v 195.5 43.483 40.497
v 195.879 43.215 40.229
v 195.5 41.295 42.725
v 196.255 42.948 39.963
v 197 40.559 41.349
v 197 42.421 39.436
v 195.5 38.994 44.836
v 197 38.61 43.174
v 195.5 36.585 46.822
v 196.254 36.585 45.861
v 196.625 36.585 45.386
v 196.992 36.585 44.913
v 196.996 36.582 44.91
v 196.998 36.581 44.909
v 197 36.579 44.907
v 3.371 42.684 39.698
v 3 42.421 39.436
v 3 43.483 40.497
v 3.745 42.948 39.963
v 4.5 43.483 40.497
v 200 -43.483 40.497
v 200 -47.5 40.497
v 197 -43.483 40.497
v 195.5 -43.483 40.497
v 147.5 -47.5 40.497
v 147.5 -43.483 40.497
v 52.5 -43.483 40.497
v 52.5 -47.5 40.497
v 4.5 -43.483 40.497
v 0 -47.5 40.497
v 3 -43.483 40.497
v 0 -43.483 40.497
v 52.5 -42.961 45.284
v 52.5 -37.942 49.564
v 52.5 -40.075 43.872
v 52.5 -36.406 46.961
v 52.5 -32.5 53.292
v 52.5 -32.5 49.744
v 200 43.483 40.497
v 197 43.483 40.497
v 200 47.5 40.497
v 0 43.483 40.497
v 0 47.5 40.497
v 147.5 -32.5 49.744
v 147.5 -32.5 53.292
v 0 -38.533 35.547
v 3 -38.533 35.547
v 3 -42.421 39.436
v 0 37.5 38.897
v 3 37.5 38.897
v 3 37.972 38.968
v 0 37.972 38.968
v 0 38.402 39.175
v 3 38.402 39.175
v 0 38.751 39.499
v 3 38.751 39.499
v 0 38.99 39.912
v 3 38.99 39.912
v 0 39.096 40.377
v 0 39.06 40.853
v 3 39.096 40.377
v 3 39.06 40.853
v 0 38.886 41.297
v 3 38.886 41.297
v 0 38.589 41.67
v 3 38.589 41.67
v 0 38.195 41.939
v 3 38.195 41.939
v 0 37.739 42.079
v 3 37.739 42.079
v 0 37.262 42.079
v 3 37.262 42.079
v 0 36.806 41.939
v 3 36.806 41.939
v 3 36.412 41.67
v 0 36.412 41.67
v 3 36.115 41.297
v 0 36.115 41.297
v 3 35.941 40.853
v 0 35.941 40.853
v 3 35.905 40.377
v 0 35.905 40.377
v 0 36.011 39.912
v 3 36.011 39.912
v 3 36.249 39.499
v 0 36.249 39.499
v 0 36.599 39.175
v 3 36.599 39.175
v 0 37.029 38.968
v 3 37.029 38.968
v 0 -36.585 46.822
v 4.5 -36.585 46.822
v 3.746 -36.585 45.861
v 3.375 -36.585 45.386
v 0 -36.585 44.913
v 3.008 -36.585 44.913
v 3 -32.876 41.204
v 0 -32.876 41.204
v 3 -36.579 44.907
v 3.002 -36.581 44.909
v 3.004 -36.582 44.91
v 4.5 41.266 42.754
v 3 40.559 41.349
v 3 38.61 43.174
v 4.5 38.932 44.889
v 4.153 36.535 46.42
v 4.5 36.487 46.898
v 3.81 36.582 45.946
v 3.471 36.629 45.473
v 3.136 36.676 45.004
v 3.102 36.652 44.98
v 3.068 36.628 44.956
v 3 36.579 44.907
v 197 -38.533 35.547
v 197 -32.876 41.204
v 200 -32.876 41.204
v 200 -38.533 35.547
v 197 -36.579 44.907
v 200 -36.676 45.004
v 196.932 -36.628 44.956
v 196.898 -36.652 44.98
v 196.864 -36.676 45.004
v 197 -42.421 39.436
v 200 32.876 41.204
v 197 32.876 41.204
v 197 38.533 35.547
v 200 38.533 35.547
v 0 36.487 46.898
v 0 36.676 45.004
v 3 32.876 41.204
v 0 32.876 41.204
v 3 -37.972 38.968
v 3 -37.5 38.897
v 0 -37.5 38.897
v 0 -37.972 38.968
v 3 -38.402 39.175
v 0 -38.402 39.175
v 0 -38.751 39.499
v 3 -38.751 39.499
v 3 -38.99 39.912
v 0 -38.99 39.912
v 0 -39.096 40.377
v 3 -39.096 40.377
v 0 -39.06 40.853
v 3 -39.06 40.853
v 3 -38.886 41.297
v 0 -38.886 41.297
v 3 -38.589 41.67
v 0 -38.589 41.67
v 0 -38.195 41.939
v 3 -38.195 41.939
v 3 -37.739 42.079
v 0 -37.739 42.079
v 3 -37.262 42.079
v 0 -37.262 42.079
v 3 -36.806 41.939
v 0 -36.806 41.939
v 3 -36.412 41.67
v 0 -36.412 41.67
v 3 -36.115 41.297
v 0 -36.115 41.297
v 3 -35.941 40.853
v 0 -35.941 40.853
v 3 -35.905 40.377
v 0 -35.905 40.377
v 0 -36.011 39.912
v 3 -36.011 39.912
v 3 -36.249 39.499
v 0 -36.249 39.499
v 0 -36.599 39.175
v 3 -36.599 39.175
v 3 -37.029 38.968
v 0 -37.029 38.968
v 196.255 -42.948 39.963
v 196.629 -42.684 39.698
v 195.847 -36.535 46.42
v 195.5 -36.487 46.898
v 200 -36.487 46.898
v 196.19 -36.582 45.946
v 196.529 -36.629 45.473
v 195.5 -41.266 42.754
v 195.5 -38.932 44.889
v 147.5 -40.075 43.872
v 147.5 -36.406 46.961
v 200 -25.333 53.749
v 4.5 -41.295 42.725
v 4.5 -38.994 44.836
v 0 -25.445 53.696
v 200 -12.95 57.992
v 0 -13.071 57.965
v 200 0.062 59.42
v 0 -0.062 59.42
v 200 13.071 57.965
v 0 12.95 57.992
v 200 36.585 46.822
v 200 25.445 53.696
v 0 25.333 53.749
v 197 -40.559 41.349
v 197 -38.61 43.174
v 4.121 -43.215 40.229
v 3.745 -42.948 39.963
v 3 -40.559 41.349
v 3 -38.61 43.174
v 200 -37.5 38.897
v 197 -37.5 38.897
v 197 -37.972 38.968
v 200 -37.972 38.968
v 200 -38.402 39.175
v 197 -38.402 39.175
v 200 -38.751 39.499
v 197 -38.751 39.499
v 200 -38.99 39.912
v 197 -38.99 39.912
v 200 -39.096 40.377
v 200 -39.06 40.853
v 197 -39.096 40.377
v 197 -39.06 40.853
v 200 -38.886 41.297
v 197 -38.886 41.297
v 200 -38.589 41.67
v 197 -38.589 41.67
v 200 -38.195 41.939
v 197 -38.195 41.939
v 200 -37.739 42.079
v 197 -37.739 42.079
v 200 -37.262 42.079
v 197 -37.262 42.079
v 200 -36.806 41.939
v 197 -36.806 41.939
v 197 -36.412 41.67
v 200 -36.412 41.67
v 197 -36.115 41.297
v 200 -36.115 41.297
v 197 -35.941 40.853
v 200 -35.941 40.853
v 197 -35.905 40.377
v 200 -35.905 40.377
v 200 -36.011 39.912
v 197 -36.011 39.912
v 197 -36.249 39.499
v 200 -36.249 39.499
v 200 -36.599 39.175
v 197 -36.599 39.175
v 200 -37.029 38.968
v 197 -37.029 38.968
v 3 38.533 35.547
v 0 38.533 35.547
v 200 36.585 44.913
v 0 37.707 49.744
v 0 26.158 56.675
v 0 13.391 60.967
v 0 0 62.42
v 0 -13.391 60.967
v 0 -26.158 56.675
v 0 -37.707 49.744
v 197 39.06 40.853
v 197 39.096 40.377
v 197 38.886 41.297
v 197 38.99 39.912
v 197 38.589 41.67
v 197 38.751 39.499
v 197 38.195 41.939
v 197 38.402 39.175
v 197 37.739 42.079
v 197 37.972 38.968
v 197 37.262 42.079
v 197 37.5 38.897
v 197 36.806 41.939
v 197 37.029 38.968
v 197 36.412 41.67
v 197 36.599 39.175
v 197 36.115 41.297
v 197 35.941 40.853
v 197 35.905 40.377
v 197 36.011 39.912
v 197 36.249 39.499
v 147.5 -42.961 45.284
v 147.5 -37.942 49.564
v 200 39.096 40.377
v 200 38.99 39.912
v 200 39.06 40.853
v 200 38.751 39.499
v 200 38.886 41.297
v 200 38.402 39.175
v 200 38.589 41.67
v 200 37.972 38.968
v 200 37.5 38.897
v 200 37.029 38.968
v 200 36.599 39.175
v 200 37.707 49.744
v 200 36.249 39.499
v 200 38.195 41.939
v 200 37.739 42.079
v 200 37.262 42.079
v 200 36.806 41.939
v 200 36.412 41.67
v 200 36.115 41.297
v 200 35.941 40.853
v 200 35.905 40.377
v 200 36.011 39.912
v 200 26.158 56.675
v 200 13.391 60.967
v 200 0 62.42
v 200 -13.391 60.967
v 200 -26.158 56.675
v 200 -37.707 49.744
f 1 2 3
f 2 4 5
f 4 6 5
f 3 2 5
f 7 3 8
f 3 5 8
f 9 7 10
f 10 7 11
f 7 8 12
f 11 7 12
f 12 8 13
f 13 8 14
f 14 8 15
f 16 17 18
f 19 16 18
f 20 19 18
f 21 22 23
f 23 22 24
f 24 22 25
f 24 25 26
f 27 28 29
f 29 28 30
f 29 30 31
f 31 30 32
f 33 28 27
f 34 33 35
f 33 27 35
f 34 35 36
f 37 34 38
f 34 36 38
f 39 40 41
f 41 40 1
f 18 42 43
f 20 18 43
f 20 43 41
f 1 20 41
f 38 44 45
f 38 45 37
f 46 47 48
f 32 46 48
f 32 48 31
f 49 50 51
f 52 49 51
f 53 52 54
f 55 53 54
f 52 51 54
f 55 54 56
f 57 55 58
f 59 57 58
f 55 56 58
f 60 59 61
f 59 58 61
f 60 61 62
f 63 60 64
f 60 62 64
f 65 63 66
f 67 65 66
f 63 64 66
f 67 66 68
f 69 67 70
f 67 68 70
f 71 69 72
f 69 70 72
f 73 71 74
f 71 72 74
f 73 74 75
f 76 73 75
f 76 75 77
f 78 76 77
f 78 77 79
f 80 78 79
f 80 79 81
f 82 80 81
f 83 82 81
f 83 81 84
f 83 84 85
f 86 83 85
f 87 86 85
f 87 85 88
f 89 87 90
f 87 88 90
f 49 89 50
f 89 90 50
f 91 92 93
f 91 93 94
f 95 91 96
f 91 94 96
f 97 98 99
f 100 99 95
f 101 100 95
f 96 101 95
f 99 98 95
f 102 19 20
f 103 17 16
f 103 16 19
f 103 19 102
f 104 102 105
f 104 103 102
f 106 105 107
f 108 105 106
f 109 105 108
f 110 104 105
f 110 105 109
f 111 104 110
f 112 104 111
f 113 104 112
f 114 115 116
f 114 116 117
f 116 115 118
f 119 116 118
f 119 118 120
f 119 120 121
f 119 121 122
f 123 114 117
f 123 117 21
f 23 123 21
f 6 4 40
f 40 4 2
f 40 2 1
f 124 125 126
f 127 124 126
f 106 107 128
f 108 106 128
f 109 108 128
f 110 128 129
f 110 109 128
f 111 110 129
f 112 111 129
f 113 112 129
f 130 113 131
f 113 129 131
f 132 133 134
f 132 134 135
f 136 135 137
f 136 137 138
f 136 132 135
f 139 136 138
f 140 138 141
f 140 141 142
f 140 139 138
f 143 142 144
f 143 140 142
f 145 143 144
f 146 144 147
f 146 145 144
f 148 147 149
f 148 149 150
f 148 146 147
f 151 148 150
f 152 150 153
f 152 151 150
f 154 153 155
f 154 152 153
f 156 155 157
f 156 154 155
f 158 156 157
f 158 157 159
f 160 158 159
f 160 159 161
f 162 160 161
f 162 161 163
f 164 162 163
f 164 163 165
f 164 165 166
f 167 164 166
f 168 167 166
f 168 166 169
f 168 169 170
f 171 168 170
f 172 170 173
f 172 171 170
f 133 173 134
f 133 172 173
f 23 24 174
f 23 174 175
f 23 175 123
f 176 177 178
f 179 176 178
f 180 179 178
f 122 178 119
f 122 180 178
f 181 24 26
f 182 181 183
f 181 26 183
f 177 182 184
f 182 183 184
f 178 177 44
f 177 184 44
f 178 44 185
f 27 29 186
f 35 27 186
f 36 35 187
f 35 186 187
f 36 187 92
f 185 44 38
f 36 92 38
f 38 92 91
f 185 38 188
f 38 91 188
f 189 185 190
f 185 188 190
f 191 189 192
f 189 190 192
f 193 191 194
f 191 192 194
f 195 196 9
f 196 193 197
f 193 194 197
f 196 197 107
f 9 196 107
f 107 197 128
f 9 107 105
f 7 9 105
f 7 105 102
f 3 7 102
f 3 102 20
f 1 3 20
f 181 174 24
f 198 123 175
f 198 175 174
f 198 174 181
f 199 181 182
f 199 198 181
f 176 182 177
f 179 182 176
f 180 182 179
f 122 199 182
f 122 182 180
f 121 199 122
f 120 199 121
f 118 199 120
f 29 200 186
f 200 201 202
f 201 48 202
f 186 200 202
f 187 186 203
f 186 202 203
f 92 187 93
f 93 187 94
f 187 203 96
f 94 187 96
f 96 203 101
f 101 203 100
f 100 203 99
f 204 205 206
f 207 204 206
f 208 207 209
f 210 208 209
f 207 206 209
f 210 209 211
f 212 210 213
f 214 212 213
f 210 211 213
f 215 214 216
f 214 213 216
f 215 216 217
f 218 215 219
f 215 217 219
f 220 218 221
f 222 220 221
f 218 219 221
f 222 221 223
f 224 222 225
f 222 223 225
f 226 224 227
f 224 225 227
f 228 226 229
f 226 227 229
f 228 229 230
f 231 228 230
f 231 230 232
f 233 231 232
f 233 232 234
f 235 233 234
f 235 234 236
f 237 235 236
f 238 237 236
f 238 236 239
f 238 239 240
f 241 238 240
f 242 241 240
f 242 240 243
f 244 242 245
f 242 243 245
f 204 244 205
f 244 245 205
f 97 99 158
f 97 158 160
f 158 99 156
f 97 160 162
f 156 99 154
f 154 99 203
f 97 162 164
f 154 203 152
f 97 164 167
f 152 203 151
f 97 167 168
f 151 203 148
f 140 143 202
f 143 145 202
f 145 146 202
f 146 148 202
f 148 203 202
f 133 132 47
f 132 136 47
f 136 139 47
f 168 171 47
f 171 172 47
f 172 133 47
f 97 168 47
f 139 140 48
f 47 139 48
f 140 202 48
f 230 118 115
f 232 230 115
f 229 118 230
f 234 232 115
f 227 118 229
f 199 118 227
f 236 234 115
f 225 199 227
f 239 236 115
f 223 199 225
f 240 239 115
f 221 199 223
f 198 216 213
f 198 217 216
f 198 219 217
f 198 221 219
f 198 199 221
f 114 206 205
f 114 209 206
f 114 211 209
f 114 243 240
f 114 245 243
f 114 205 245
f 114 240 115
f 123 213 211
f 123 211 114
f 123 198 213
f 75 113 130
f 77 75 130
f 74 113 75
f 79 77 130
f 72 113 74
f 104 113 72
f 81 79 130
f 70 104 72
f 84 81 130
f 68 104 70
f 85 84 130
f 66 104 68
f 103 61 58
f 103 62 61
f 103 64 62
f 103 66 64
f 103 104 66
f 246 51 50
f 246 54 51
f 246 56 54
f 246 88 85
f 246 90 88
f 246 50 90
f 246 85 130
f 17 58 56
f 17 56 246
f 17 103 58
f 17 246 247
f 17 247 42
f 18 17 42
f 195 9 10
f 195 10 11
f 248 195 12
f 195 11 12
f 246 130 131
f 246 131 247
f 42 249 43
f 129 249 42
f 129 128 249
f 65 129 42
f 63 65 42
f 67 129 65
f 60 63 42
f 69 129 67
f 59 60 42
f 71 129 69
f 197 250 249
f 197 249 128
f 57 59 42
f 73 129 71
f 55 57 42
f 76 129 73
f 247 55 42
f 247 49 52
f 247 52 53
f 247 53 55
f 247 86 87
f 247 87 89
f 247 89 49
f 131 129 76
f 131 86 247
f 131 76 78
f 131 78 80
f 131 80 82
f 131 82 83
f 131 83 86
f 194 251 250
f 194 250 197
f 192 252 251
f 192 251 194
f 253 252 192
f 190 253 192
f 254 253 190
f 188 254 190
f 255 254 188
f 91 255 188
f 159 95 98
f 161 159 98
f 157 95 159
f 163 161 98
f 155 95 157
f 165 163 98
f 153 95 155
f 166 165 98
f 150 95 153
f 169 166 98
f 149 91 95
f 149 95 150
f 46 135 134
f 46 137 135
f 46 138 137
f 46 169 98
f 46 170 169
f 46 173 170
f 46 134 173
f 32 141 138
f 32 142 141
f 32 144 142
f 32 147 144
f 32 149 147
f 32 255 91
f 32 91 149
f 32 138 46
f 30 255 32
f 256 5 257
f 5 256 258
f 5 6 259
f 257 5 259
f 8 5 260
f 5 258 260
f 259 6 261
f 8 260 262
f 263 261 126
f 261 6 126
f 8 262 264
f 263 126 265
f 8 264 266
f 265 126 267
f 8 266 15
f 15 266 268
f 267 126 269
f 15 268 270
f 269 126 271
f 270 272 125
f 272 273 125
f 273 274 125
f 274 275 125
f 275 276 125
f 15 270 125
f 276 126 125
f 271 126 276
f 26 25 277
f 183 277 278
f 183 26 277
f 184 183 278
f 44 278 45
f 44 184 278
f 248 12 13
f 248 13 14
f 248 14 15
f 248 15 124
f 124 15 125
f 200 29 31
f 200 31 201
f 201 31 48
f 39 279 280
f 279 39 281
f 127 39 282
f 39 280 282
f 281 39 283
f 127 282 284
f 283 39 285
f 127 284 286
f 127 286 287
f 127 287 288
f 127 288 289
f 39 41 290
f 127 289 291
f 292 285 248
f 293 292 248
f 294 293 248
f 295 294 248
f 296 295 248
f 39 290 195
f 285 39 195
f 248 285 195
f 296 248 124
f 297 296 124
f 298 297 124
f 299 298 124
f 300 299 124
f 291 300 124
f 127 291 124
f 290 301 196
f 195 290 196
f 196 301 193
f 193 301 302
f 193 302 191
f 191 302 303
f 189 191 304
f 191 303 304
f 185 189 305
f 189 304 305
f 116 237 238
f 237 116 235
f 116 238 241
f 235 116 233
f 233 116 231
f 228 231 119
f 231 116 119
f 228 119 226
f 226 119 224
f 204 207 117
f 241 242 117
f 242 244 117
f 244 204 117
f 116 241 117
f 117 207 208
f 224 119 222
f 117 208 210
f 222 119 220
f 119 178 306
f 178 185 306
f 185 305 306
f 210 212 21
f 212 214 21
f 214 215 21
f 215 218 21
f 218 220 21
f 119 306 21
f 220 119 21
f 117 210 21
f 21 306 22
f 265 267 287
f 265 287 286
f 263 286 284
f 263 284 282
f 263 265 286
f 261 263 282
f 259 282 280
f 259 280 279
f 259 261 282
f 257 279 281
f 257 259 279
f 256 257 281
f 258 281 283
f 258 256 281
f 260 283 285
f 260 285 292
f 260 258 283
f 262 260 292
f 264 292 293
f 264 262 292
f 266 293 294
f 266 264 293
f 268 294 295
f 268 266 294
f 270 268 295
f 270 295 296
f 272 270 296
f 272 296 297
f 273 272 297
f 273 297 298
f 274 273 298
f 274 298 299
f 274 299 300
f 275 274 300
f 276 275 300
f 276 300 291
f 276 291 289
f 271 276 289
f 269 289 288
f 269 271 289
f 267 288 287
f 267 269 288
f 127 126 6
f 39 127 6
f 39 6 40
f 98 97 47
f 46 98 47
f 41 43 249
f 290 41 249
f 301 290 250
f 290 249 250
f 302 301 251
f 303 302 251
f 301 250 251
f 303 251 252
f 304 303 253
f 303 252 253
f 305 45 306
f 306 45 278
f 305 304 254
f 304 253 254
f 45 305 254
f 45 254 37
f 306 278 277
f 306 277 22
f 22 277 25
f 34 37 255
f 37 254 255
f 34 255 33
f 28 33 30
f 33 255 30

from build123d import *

# Parameters (mm, degrees)
EXTRUDE_2_DEPTH          = 200
EXTRUDE_START            = -3
SKETCH_3_R               = 1.6
EXTRUDE_3_DEPTH          = 3
MIRROR_START             = -3
MIRROR_3_COPY_1_SKETCH_R = 1.6
MIRROR_3_COPY_1_DEPTH    = 3
CHAMFER_2_SIZE           = 1.5
CHAMFER_2_SIZE_2         = 1.370885416
CUT_EXTRUDE_1_REACH      = 208.729
CUT_EXTRUDE_1_END_RADIUS = 62.42
SKETCH_4_W               = 95
SKETCH_4_H               = 15


with BuildPart() as part:
    # 草图2 → 凸台-拉伸2 (new body)
    with BuildSketch(Plane(origin=(0, 0, 0), x_dir=(0, 0, -1), z_dir=(1, 0, 0))):
        with BuildLine():
            Line((-40.496992481, 43.482525226), (-40.496992481, 47.5))
            ThreePointArc((-40.496992481, 47.5), (-62.42, 0), (-40.496992481, -47.5))
            Line((-40.496992481, -47.5), (-40.496992481, -43.482525226))
            ThreePointArc((-40.496992481, -43.482525226), (-59.42, 0), (-40.496992481, 43.482525226))
        make_face()
    extrude(amount=EXTRUDE_2_DEPTH)

    # 草图3 → 凸台-拉伸3 (add)
    with BuildSketch(Plane(origin=(200, 0, 0), x_dir=(0, 0, -1), z_dir=(1, 0, 0)).offset(EXTRUDE_START)):
        with BuildLine():
            Line((-35.547245013, 38.532777757), (-40.496992481, 43.482525226))
            ThreePointArc((-40.496992481, 43.482525226), (-43.333653576, 40.656252505), (-45.973519494, 37.64534374))
            Line((-45.973519494, 37.64534374), (-41.204099262, 32.875923508))
            Line((-41.204099262, 32.875923508), (-35.547245013, 38.532777757))
        make_face()
        with Locations((-40.496992481, 37.500401857)):
            Circle(SKETCH_3_R, mode=Mode.SUBTRACT)
    extrude_3 = extrude(amount=EXTRUDE_3_DEPTH)

    # 镜向2: 凸台-拉伸3 across plane
    add(extrude_3.mirror(Plane.ZX))

    # 镜向3: 凸台-拉伸3 across plane
    add(extrude_3.mirror(Plane(origin=(100, 0, 0), x_dir=(0, 0, 1), z_dir=(1, 0, 0))))

    # 镜向3 copy 1 sketch → 镜向3 copy 1 (add)
    with BuildSketch(Plane(origin=(0, 0, 0), x_dir=(0, 0, -1), z_dir=(-1, 0, 0)).offset(MIRROR_START)):
        with BuildLine():
            Line((-35.547245013, 38.532777757), (-40.496992481, 43.482525226))
            ThreePointArc((-40.496992481, 43.482525226), (-43.333653576, 40.656252505), (-45.973519494, 37.64534374))
            Line((-45.973519494, 37.64534374), (-41.204099262, 32.875923508))
            Line((-41.204099262, 32.875923508), (-35.547245013, 38.532777757))
        make_face()
        with Locations((-40.496992481, 37.500401857)):
            Circle(MIRROR_3_COPY_1_SKETCH_R, mode=Mode.SUBTRACT)
    extrude(amount=MIRROR_3_COPY_1_DEPTH)

    # 倒角2
    # the kernel refuses this chamfer: 1.5, 1.370885416 mm, written as the material it adds along each edge
    with BuildSketch(Plane(origin=(197, 37.64534374, 45.973519494), x_dir=(0, -0.7808949499846061, 0.6246623704758754), z_dir=(1, 0, 0)), Plane(origin=(3, -37.64534374, 45.973519494), x_dir=(0, 0.7808949499846081, 0.6246623704758728), z_dir=(-1, 0, 0))) as chamfer_2_piece_1:
        with BuildLine():
            Line((1.358262301, 0), (CHAMFER_2_SIZE * 0.110473116413, CHAMFER_2_SIZE * 0.993879112644))
            Line((CHAMFER_2_SIZE * 0.110473116413, CHAMFER_2_SIZE * 0.993879112644), (0, 0))
            ThreePointArc((0, 0), (0.697864858, -0.003878183), (1.358262301, 0))
        make_face()
    extrude(amount=3)
    with BuildSketch(Plane(origin=(197, 0, 0), x_dir=(0, 0.774455373383828, 0.6326285439631345), z_dir=(0, 0.6326285439631345, -0.774455373383828))) as chamfer_2_piece_2_section:
        Polygon((59.42, -CHAMFER_2_SIZE), (59.42 - CHAMFER_2_SIZE, 0), (59.42, 0), align=None)
    chamfer_2_piece_2 = revolve(axis=Axis((197, 0, 0), (1, 0, 0)), revolution_arc=15.163035172, mode=Mode.PRIVATE)
    chamfer_2_piece_2 = split(chamfer_2_piece_2, bisect_by=Plane(origin=(197, 0, 40.496992481), z_dir=(0, 0, -1)), keep=Keep.TOP, mode=Mode.PRIVATE)
    chamfer_2_piece_2 = split(chamfer_2_piece_2, bisect_by=Plane(origin=(197, 1.492766372, -1.492766372), z_dir=(0, -0.707106781186547, 0.707106781186548)), keep=Keep.TOP, mode=Mode.PRIVATE)
    add(chamfer_2_piece_2)
    with BuildSketch(Plane(origin=(197, 0, 0), x_dir=(0, 0.774455373383828, 0.6326285439631345), z_dir=(0, 0.6326285439631345, -0.774455373383828))) as chamfer_2_piece_3_section:
        Polygon((59.42, -CHAMFER_2_SIZE), (59.42 - CHAMFER_2_SIZE, 0), (59.42, 0), align=None)
    chamfer_2_piece_3 = revolve(axis=Axis((197, 0, 0), (1, 0, 0)), revolution_arc=15.163035172, mode=Mode.PRIVATE)
    chamfer_2_piece_3 = split(chamfer_2_piece_3, bisect_by=Plane(origin=(197, 0, 40.496992481), z_dir=(0, 0, 1)), keep=Keep.TOP, mode=Mode.PRIVATE)
    chamfer_2_piece_3 = split(chamfer_2_piece_3, bisect_by=Plane(origin=(197, -4.164087877, 4.164087877), z_dir=(0, 0.7071067811865476, -0.7071067811865476)), keep=Keep.TOP, mode=Mode.PRIVATE)
    chamfer_2_piece_3 = split(chamfer_2_piece_3, bisect_by=Plane(origin=(197, 1.492766372, -1.492766372), z_dir=(0, -0.707106781186547, 0.707106781186548)), keep=Keep.TOP, mode=Mode.PRIVATE)
    add(chamfer_2_piece_3)
    with BuildSketch(Plane(origin=(197, 0, 0), x_dir=(0, -0.774455373383828, 0.6326285439631345), z_dir=(0, -0.6326285439631345, -0.774455373383828))) as chamfer_2_piece_4_section:
        Polygon((59.42, CHAMFER_2_SIZE), (59.42 - CHAMFER_2_SIZE, 0), (59.42, 0), align=None)
    chamfer_2_piece_4 = revolve(axis=Axis((197, 0, 0), (-1, 0, 0)), revolution_arc=15.163035172, mode=Mode.PRIVATE)
    chamfer_2_piece_4 = split(chamfer_2_piece_4, bisect_by=Plane(origin=(197, 0, 40.496992481), z_dir=(0, 0, -1)), keep=Keep.TOP, mode=Mode.PRIVATE)
    chamfer_2_piece_4 = split(chamfer_2_piece_4, bisect_by=Plane(origin=(197, -1.492766372, -1.492766372), z_dir=(0, 0.707106781186547, 0.707106781186548)), keep=Keep.TOP, mode=Mode.PRIVATE)
    add(chamfer_2_piece_4)
    with BuildSketch(Plane(origin=(197, 0, 0), x_dir=(0, -0.774455373383828, 0.6326285439631345), z_dir=(0, -0.6326285439631345, -0.774455373383828))) as chamfer_2_piece_5_section:
        Polygon((59.42, CHAMFER_2_SIZE), (59.42 - CHAMFER_2_SIZE, 0), (59.42, 0), align=None)
    chamfer_2_piece_5 = revolve(axis=Axis((197, 0, 0), (-1, 0, 0)), revolution_arc=15.163035172, mode=Mode.PRIVATE)
    chamfer_2_piece_5 = split(chamfer_2_piece_5, bisect_by=Plane(origin=(197, 0, 40.496992481), z_dir=(0, 0, 1)), keep=Keep.TOP, mode=Mode.PRIVATE)
    chamfer_2_piece_5 = split(chamfer_2_piece_5, bisect_by=Plane(origin=(197, 4.164087877, 4.164087877), z_dir=(0, -0.7071067811865476, -0.7071067811865476)), keep=Keep.TOP, mode=Mode.PRIVATE)
    chamfer_2_piece_5 = split(chamfer_2_piece_5, bisect_by=Plane(origin=(197, -1.492766372, -1.492766372), z_dir=(0, 0.707106781186547, 0.707106781186548)), keep=Keep.TOP, mode=Mode.PRIVATE)
    add(chamfer_2_piece_5)
    with BuildSketch(Plane(origin=(3, 0, 0), x_dir=(0, 0.7744553733838281, 0.6326285439631345), z_dir=(0, 0.6326285439631345, -0.7744553733838281))) as chamfer_2_piece_6_section:
        Polygon((59.42, CHAMFER_2_SIZE), (59.42 - CHAMFER_2_SIZE, 0), (59.42, 0), align=None)
    chamfer_2_piece_6 = revolve(axis=Axis((3, 0, 0), (1, 0, 0)), revolution_arc=15.163035172, mode=Mode.PRIVATE)
    chamfer_2_piece_6 = split(chamfer_2_piece_6, bisect_by=Plane(origin=(3, 0, 40.496992481), z_dir=(0, 0, -1)), keep=Keep.TOP, mode=Mode.PRIVATE)
    chamfer_2_piece_6 = split(chamfer_2_piece_6, bisect_by=Plane(origin=(3, 1.492766372, -1.492766372), z_dir=(0, -0.707106781186547, 0.707106781186548)), keep=Keep.TOP, mode=Mode.PRIVATE)
    add(chamfer_2_piece_6)
    with BuildSketch(Plane(origin=(3, 0, 0), x_dir=(0, 0.7744553733838281, 0.6326285439631345), z_dir=(0, 0.6326285439631345, -0.7744553733838281))) as chamfer_2_piece_7_section:
        Polygon((59.42, CHAMFER_2_SIZE), (59.42 - CHAMFER_2_SIZE, 0), (59.42, 0), align=None)
    chamfer_2_piece_7 = revolve(axis=Axis((3, 0, 0), (1, 0, 0)), revolution_arc=15.163035172, mode=Mode.PRIVATE)
    chamfer_2_piece_7 = split(chamfer_2_piece_7, bisect_by=Plane(origin=(3, 0, 40.496992481), z_dir=(0, 0, 1)), keep=Keep.TOP, mode=Mode.PRIVATE)
    chamfer_2_piece_7 = split(chamfer_2_piece_7, bisect_by=Plane(origin=(3, -4.164087877, 4.164087877), z_dir=(0, 0.7071067811865476, -0.7071067811865476)), keep=Keep.TOP, mode=Mode.PRIVATE)
    chamfer_2_piece_7 = split(chamfer_2_piece_7, bisect_by=Plane(origin=(3, 1.492766372, -1.492766372), z_dir=(0, -0.707106781186547, 0.707106781186548)), keep=Keep.TOP, mode=Mode.PRIVATE)
    add(chamfer_2_piece_7)
    with BuildSketch(Plane(origin=(3, 0, 0), x_dir=(0, -0.7744553733838281, 0.6326285439631345), z_dir=(0, -0.6326285439631345, -0.7744553733838281))) as chamfer_2_piece_8_section:
        Polygon((59.42, -CHAMFER_2_SIZE), (59.42 - CHAMFER_2_SIZE, 0), (59.42, 0), align=None)
    chamfer_2_piece_8 = revolve(axis=Axis((3, 0, 0), (-1, 0, 0)), revolution_arc=15.163035172, mode=Mode.PRIVATE)
    chamfer_2_piece_8 = split(chamfer_2_piece_8, bisect_by=Plane(origin=(3, 0, 40.496992481), z_dir=(0, 0, -1)), keep=Keep.TOP, mode=Mode.PRIVATE)
    chamfer_2_piece_8 = split(chamfer_2_piece_8, bisect_by=Plane(origin=(3, -1.492766372, -1.492766372), z_dir=(0, 0.707106781186547, 0.707106781186548)), keep=Keep.TOP, mode=Mode.PRIVATE)
    add(chamfer_2_piece_8)
    with BuildSketch(Plane(origin=(3, 0, 0), x_dir=(0, -0.7744553733838281, 0.6326285439631345), z_dir=(0, -0.6326285439631345, -0.7744553733838281))) as chamfer_2_piece_9_section:
        Polygon((59.42, -CHAMFER_2_SIZE), (59.42 - CHAMFER_2_SIZE, 0), (59.42, 0), align=None)
    chamfer_2_piece_9 = revolve(axis=Axis((3, 0, 0), (-1, 0, 0)), revolution_arc=15.163035172, mode=Mode.PRIVATE)
    chamfer_2_piece_9 = split(chamfer_2_piece_9, bisect_by=Plane(origin=(3, 0, 40.496992481), z_dir=(0, 0, 1)), keep=Keep.TOP, mode=Mode.PRIVATE)
    chamfer_2_piece_9 = split(chamfer_2_piece_9, bisect_by=Plane(origin=(3, 4.164087877, 4.164087877), z_dir=(0, -0.7071067811865476, -0.7071067811865476)), keep=Keep.TOP, mode=Mode.PRIVATE)
    chamfer_2_piece_9 = split(chamfer_2_piece_9, bisect_by=Plane(origin=(3, -1.492766372, -1.492766372), z_dir=(0, 0.707106781186547, 0.707106781186548)), keep=Keep.TOP, mode=Mode.PRIVATE)
    add(chamfer_2_piece_9)
    with BuildSketch(Plane(origin=(197, -37.64534374, 45.973519494), x_dir=(0, 0.7815431035681409, 0.623851246103651), z_dir=(1, 0, 0)), Plane(origin=(3, 37.64534374, 45.973519494), x_dir=(0, -0.7815431035681428, 0.6238512461036486), z_dir=(-1, 0, 0))) as chamfer_2_piece_10:
        with BuildLine():
            Line((1.481642714, 0), (CHAMFER_2_SIZE_2 * 0.111504981769, -CHAMFER_2_SIZE_2 * 0.993763875055))
            Line((CHAMFER_2_SIZE_2 * 0.111504981769, -CHAMFER_2_SIZE_2 * 0.993763875055), (0, 0))
            ThreePointArc((0, 0), (0.761762493, 0.0046146), (1.481642714, 0))
        make_face()
    extrude(amount=3)
    with BuildSketch(Plane(origin=(197, 0, 0), x_dir=(0, 0.774455373383828, 0.6326285439631345), z_dir=(0, 0.6326285439631345, -0.774455373383828))) as chamfer_2_piece_11a_section:
        Polygon((59.42, -CHAMFER_2_SIZE), (59.42 - CHAMFER_2_SIZE, 0), (59.42, 0), align=None)
    chamfer_2_piece_11a = revolve(axis=Axis((197, 0, 0), (1, 0, 0)), revolution_arc=15.163035172, mode=Mode.PRIVATE)
    chamfer_2_piece_11a = split(chamfer_2_piece_11a, bisect_by=Plane(origin=(197, -4.164087877, 4.164087877), z_dir=(0, -0.7071067811865476, 0.7071067811865476)), keep=Keep.TOP, mode=Mode.PRIVATE)
    with BuildSketch(Plane(origin=(193.142475518, 37.64534374, 45.973519494), x_dir=(0, -0.7808949499846061, 0.6246623704758754), z_dir=(1, 0, 0))) as chamfer_2_piece_11b_section:
        with BuildLine():
            Line((1.358262301, 0), (CHAMFER_2_SIZE * 0.110473116413, CHAMFER_2_SIZE * 0.993879112644))
            Line((CHAMFER_2_SIZE * 0.110473116413, CHAMFER_2_SIZE * 0.993879112644), (0, 0))
            ThreePointArc((0, 0), (0.697864858, -0.003878183), (1.358262301, 0))
        make_face()
    chamfer_2_piece_11b = extrude(amount=6.857524482, mode=Mode.PRIVATE)
    chamfer_2_piece_11b = split(chamfer_2_piece_11b, bisect_by=Plane(origin=(197, 37.64534374, 45.973519494), z_dir=(-1, 0, 0)), keep=Keep.TOP, mode=Mode.PRIVATE)
    chamfer_2_piece_11 = chamfer_2_piece_11a & chamfer_2_piece_11b
    add(chamfer_2_piece_11)
    with BuildSketch(Plane(origin=(193.189644475, -37.64534374, 45.973519494), x_dir=(0, 0.7815431035681409, 0.623851246103651), z_dir=(1, 0, 0))) as chamfer_2_piece_12a_section:
        with BuildLine():
            Line((1.481642714, 0), (CHAMFER_2_SIZE_2 * 0.111504981769, -CHAMFER_2_SIZE_2 * 0.993763875055))
            Line((CHAMFER_2_SIZE_2 * 0.111504981769, -CHAMFER_2_SIZE_2 * 0.993763875055), (0, 0))
            ThreePointArc((0, 0), (0.761762493, 0.0046146), (1.481642714, 0))
        make_face()
    chamfer_2_piece_12a = extrude(amount=6.810355525, mode=Mode.PRIVATE)
    chamfer_2_piece_12a = split(chamfer_2_piece_12a, bisect_by=Plane(origin=(197, -37.64534374, 45.973519494), z_dir=(-1, 0, 0)), keep=Keep.TOP, mode=Mode.PRIVATE)
    with BuildSketch(Plane(origin=(197, 0, 0), x_dir=(0, -0.774455373383828, 0.6326285439631345), z_dir=(0, -0.6326285439631345, -0.774455373383828))) as chamfer_2_piece_12b_section:
        Polygon((59.42, CHAMFER_2_SIZE), (59.42 - CHAMFER_2_SIZE, 0), (59.42, 0), align=None)
    chamfer_2_piece_12b = revolve(axis=Axis((197, 0, 0), (-1, 0, 0)), revolution_arc=15.163035172, mode=Mode.PRIVATE)
    chamfer_2_piece_12b = split(chamfer_2_piece_12b, bisect_by=Plane(origin=(197, 4.164087877, 4.164087877), z_dir=(0, 0.7071067811865476, 0.7071067811865476)), keep=Keep.TOP, mode=Mode.PRIVATE)
    chamfer_2_piece_12 = chamfer_2_piece_12a & chamfer_2_piece_12b
    add(chamfer_2_piece_12)
    with BuildSketch(Plane(origin=(6.810355525, 37.64534374, 45.973519494), x_dir=(0, -0.7815431035681428, 0.6238512461036486), z_dir=(-1, 0, 0))) as chamfer_2_piece_13a_section:
        with BuildLine():
            Line((1.481642714, 0), (CHAMFER_2_SIZE_2 * 0.111504981769, -CHAMFER_2_SIZE_2 * 0.993763875055))
            Line((CHAMFER_2_SIZE_2 * 0.111504981769, -CHAMFER_2_SIZE_2 * 0.993763875055), (0, 0))
            ThreePointArc((0, 0), (0.761762493, 0.0046146), (1.481642714, 0))
        make_face()
    chamfer_2_piece_13a = extrude(amount=6.810355525, mode=Mode.PRIVATE)
    chamfer_2_piece_13a = split(chamfer_2_piece_13a, bisect_by=Plane(origin=(3, 37.64534374, 45.973519494), z_dir=(1, 0, 0)), keep=Keep.TOP, mode=Mode.PRIVATE)
    with BuildSketch(Plane(origin=(3, 0, 0), x_dir=(0, 0.7744553733838281, 0.6326285439631345), z_dir=(0, 0.6326285439631345, -0.7744553733838281))) as chamfer_2_piece_13b_section:
        Polygon((59.42, CHAMFER_2_SIZE), (59.42 - CHAMFER_2_SIZE, 0), (59.42, 0), align=None)
    chamfer_2_piece_13b = revolve(axis=Axis((3, 0, 0), (1, 0, 0)), revolution_arc=15.163035172, mode=Mode.PRIVATE)
    chamfer_2_piece_13b = split(chamfer_2_piece_13b, bisect_by=Plane(origin=(3, -4.164087877, 4.164087877), z_dir=(0, -0.7071067811865476, 0.7071067811865476)), keep=Keep.TOP, mode=Mode.PRIVATE)
    chamfer_2_piece_13 = chamfer_2_piece_13a & chamfer_2_piece_13b
    add(chamfer_2_piece_13)
    with BuildSketch(Plane(origin=(3, 0, 0), x_dir=(0, -0.7744553733838281, 0.6326285439631345), z_dir=(0, -0.6326285439631345, -0.7744553733838281))) as chamfer_2_piece_14a_section:
        Polygon((59.42, -CHAMFER_2_SIZE), (59.42 - CHAMFER_2_SIZE, 0), (59.42, 0), align=None)
    chamfer_2_piece_14a = revolve(axis=Axis((3, 0, 0), (-1, 0, 0)), revolution_arc=15.163035172, mode=Mode.PRIVATE)
    chamfer_2_piece_14a = split(chamfer_2_piece_14a, bisect_by=Plane(origin=(3, 4.164087877, 4.164087877), z_dir=(0, 0.7071067811865476, 0.7071067811865476)), keep=Keep.TOP, mode=Mode.PRIVATE)
    with BuildSketch(Plane(origin=(6.857524482, -37.64534374, 45.973519494), x_dir=(0, 0.7808949499846081, 0.6246623704758728), z_dir=(-1, 0, 0))) as chamfer_2_piece_14b_section:
        with BuildLine():
            Line((1.358262301, 0), (CHAMFER_2_SIZE * 0.110473116413, CHAMFER_2_SIZE * 0.993879112644))
            Line((CHAMFER_2_SIZE * 0.110473116413, CHAMFER_2_SIZE * 0.993879112644), (0, 0))
            ThreePointArc((0, 0), (0.697864858, -0.003878183), (1.358262301, 0))
        make_face()
    chamfer_2_piece_14b = extrude(amount=6.857524482, mode=Mode.PRIVATE)
    chamfer_2_piece_14b = split(chamfer_2_piece_14b, bisect_by=Plane(origin=(3, -37.64534374, 45.973519494), z_dir=(1, 0, 0)), keep=Keep.TOP, mode=Mode.PRIVATE)
    chamfer_2_piece_14 = chamfer_2_piece_14a & chamfer_2_piece_14b
    add(chamfer_2_piece_14)

    # 切除-拉伸1: up to this cylinder (the profile starts inside it)
    cut_extrude_1_end = Plane(origin=(100, 0, 0), z_dir=(-1, 0, 0)) * Cylinder(CUT_EXTRUDE_1_END_RADIUS, 543.298, mode=Mode.PRIVATE)
    # 草图4 → 切除-拉伸1 (cut, up to the surface)
    with BuildSketch(Plane(origin=(0, 0, 40.496992481), x_dir=(-1, 0, 0), z_dir=(0, 0, -1)), mode=Mode.PRIVATE) as cut_extrude_1_sk1:
        with Locations((-100, -40)):
            Rectangle(SKETCH_4_W, SKETCH_4_H)
    cut_extrude_1_tool1 = extrude(cut_extrude_1_sk1.sketch, amount=-CUT_EXTRUDE_1_REACH, mode=Mode.PRIVATE) & cut_extrude_1_end
    add(cut_extrude_1_tool1.solids().sort_by_distance((100, -40, 40.496992))[0], mode=Mode.SUBTRACT)


solid = part.part
